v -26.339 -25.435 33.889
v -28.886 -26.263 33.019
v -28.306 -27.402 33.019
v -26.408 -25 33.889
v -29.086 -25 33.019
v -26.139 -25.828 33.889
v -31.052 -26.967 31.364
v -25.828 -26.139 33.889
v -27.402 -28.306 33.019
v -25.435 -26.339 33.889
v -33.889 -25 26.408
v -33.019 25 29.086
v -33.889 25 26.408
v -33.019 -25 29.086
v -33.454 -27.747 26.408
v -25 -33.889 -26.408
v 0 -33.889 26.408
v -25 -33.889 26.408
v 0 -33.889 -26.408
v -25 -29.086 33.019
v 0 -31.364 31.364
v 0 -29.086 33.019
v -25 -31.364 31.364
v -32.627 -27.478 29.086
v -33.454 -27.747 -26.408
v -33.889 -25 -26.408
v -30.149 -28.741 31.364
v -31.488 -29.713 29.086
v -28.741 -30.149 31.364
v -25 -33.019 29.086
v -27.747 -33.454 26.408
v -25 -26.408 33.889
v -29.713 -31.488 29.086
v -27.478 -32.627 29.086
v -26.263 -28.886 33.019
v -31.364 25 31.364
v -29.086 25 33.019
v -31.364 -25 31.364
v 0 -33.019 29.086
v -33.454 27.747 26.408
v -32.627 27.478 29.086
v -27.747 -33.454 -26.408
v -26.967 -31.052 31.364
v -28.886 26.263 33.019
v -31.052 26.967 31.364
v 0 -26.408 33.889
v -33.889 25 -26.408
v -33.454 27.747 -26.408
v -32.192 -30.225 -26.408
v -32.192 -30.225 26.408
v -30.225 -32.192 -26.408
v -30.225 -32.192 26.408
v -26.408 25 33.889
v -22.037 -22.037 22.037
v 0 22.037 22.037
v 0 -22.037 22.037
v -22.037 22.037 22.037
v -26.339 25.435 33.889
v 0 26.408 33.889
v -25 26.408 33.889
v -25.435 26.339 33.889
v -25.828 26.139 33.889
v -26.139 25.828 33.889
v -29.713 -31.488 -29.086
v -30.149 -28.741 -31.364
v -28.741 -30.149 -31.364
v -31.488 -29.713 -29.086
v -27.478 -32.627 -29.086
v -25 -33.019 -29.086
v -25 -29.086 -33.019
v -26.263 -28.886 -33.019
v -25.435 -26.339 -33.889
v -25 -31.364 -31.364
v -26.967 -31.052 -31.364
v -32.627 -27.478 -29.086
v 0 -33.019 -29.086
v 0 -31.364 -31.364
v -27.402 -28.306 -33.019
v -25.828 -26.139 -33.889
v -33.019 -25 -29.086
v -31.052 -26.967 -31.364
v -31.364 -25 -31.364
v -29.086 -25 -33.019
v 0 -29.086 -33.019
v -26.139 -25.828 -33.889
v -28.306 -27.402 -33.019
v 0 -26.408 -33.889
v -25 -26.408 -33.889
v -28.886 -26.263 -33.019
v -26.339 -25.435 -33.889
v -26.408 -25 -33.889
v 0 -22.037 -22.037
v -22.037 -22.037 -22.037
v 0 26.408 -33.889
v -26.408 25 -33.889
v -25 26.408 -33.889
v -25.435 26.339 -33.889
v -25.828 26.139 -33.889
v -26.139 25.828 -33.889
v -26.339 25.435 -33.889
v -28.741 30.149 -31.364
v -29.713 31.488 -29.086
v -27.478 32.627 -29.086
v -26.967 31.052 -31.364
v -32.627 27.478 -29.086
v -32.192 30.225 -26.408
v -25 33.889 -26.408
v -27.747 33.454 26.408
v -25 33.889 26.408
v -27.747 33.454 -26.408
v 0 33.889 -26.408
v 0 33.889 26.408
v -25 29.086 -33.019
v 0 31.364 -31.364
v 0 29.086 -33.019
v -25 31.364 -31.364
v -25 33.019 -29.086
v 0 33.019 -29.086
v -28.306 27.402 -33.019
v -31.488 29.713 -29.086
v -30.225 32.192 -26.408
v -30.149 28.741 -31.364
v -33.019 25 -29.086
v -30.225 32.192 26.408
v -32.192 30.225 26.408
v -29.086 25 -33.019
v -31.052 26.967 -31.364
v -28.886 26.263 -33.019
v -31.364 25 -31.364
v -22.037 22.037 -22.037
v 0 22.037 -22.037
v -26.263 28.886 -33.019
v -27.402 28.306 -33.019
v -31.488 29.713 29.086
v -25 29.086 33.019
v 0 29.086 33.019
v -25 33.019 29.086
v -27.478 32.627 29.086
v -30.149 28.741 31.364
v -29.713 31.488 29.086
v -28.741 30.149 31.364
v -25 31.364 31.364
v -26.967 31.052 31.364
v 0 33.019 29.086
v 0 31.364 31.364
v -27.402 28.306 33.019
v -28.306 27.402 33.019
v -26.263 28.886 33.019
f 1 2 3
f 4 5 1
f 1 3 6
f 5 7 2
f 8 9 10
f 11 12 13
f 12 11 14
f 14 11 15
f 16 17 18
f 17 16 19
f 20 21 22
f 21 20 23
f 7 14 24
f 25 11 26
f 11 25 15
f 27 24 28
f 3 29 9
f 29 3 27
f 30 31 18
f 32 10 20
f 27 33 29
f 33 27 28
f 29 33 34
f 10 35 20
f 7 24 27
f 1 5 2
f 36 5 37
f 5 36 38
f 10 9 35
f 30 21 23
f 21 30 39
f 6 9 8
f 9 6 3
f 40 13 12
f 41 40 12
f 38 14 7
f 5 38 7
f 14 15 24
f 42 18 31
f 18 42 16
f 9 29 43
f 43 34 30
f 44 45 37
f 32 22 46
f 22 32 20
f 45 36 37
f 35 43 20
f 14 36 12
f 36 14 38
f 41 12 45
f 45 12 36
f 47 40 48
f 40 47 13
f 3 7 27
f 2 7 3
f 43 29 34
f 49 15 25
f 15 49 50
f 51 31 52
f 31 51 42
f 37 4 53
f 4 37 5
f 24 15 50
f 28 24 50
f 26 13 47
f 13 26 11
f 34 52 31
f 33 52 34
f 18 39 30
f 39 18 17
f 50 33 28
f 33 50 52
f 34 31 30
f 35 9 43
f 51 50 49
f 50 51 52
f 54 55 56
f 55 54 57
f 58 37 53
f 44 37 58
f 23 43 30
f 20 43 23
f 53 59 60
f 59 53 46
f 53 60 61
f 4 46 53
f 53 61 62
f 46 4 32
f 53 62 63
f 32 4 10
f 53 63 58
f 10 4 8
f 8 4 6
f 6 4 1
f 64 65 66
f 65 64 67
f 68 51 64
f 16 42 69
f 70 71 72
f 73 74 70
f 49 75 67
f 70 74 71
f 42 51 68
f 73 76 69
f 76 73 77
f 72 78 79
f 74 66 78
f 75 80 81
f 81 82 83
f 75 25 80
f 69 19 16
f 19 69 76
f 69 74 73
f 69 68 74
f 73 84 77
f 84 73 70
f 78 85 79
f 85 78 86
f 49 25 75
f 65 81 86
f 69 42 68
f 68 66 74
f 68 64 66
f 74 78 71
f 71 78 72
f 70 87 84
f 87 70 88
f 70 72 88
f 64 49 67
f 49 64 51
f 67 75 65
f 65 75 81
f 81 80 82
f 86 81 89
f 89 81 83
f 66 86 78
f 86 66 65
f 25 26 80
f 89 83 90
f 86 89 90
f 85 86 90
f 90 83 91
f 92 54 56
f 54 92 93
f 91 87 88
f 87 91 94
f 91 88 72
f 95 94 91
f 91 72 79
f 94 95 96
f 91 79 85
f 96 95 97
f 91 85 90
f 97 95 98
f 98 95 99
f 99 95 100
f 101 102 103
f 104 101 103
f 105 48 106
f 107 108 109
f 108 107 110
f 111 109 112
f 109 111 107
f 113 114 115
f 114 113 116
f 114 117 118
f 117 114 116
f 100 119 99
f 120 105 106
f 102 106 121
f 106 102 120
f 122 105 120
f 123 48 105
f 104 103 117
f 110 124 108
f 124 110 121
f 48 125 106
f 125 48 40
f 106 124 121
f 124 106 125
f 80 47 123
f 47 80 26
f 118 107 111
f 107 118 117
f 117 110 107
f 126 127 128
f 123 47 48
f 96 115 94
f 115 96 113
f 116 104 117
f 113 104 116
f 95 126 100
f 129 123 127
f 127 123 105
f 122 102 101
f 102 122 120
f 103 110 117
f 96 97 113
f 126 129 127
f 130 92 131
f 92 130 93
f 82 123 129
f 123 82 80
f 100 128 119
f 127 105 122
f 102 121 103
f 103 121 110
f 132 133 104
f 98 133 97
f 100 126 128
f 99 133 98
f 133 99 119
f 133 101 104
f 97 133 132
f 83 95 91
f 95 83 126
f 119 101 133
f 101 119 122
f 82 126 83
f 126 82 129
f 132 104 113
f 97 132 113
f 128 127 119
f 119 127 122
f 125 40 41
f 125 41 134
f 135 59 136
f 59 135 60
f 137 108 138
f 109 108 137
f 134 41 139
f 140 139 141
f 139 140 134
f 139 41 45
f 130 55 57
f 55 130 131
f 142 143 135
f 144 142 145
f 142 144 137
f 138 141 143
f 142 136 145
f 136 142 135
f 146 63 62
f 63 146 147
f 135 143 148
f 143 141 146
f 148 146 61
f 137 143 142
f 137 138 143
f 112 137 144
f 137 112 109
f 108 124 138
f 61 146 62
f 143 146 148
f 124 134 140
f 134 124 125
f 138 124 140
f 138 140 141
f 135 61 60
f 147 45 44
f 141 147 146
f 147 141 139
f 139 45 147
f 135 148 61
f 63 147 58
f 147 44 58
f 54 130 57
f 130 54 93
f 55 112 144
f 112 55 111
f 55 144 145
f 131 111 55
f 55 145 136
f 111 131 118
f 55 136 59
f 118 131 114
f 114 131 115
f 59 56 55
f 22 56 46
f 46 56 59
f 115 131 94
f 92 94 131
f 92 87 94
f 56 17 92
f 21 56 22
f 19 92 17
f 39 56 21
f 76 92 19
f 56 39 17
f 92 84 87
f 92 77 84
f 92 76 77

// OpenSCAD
$fn = 20;
//%cube(50, 50, 50, center=true);
difference(){
    minkowski(){
        difference(){
            minkowski(){
                minkowski(){
                    sphere(3);
                    cube(50, 50, 50, center=true);
                }
                sphere(3);
            }
            cube(50, 50, 50, center=true);
        }
        sphere(3);
    }
    translate([25, 0, 0]) cube([50, 80, 80], center=true);
}
